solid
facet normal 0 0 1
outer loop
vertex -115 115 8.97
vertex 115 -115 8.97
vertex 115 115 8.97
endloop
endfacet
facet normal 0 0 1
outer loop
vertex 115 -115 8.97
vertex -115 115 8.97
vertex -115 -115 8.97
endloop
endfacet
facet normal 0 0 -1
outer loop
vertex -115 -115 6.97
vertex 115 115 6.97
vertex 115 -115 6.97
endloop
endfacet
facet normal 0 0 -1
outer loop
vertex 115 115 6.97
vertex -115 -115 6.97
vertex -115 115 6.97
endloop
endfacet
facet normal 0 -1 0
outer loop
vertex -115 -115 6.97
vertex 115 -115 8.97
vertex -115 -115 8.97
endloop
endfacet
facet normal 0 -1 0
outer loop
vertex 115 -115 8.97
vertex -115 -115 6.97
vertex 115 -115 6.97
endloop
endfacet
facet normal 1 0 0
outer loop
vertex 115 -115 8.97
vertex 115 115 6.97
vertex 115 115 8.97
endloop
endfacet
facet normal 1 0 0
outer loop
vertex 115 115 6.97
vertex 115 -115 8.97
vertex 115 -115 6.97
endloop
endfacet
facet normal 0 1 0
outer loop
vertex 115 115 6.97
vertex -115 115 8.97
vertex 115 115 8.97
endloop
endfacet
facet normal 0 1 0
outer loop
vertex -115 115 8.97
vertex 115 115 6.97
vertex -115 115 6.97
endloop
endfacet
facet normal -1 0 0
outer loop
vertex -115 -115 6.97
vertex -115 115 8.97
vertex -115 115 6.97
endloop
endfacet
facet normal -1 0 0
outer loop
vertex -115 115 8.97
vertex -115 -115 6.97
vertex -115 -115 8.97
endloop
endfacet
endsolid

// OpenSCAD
base_plate_width = 230;
base_plate_height = 2;

spacer_wall = 16;
spacer_height = 28;

inner_height = 38;

outer_frame_height = 40;
outer_frame_wall = 30;
outer_frame_viewport = 224;

glass_height = 1;

gap = 1;

do_not_touch = 0.01;



outer_frame_inside_width = base_plate_width + 2 * (gap + do_not_touch);
outer_frame_outside_width = outer_frame_inside_width + 2 * outer_frame_wall;
outer_frame_inside_height = outer_frame_height - inner_height;

glass_z_pos = inner_height - glass_height - do_not_touch;

spacer_z_pos = glass_z_pos - spacer_height - do_not_touch;
spacer_inner_width = base_plate_width - 2 * spacer_wall;

base_plate_z_pos = spacer_z_pos - base_plate_height - do_not_touch;

module outer_frame() {
    difference(){
        translate([-outer_frame_outside_width/2, -outer_frame_outside_width/2, 0]) {
            cube([outer_frame_outside_width, outer_frame_outside_width, outer_frame_height]);
        }
        translate([-outer_frame_inside_width/2, -outer_frame_inside_width/2, -1]) {
            cube([outer_frame_inside_width, outer_frame_inside_width, inner_height+1]);
        }
        translate([-outer_frame_viewport/2, -outer_frame_viewport/2, -1]) {
            cube([outer_frame_viewport, outer_frame_viewport, outer_frame_height+2]);
        }
    }
}

module spacer() {
    difference() {
        translate([-base_plate_width/2, -base_plate_width/2, spacer_z_pos]) cube([base_plate_width, base_plate_width, spacer_height]);
        translate([-spacer_inner_width/2, -spacer_inner_width/2, spacer_z_pos-1]) cube([spacer_inner_width, spacer_inner_width, spacer_height+2]);
    }
}


module glass() {
    color([.9,.9,1]) translate([-base_plate_width/2, -base_plate_width/2, glass_z_pos]) cube([base_plate_width, base_plate_width, glass_height]);
}

module picture_frame() {
    outer_frame();
    spacer();
    glass();

}


module base_plate() {

    translate([-base_plate_width/2, -base_plate_width/2, base_plate_z_pos]) cube([base_plate_width, base_plate_width, base_plate_height]);
}


union() {
    %picture_frame();

    // base plate
    #base_plate();
}
